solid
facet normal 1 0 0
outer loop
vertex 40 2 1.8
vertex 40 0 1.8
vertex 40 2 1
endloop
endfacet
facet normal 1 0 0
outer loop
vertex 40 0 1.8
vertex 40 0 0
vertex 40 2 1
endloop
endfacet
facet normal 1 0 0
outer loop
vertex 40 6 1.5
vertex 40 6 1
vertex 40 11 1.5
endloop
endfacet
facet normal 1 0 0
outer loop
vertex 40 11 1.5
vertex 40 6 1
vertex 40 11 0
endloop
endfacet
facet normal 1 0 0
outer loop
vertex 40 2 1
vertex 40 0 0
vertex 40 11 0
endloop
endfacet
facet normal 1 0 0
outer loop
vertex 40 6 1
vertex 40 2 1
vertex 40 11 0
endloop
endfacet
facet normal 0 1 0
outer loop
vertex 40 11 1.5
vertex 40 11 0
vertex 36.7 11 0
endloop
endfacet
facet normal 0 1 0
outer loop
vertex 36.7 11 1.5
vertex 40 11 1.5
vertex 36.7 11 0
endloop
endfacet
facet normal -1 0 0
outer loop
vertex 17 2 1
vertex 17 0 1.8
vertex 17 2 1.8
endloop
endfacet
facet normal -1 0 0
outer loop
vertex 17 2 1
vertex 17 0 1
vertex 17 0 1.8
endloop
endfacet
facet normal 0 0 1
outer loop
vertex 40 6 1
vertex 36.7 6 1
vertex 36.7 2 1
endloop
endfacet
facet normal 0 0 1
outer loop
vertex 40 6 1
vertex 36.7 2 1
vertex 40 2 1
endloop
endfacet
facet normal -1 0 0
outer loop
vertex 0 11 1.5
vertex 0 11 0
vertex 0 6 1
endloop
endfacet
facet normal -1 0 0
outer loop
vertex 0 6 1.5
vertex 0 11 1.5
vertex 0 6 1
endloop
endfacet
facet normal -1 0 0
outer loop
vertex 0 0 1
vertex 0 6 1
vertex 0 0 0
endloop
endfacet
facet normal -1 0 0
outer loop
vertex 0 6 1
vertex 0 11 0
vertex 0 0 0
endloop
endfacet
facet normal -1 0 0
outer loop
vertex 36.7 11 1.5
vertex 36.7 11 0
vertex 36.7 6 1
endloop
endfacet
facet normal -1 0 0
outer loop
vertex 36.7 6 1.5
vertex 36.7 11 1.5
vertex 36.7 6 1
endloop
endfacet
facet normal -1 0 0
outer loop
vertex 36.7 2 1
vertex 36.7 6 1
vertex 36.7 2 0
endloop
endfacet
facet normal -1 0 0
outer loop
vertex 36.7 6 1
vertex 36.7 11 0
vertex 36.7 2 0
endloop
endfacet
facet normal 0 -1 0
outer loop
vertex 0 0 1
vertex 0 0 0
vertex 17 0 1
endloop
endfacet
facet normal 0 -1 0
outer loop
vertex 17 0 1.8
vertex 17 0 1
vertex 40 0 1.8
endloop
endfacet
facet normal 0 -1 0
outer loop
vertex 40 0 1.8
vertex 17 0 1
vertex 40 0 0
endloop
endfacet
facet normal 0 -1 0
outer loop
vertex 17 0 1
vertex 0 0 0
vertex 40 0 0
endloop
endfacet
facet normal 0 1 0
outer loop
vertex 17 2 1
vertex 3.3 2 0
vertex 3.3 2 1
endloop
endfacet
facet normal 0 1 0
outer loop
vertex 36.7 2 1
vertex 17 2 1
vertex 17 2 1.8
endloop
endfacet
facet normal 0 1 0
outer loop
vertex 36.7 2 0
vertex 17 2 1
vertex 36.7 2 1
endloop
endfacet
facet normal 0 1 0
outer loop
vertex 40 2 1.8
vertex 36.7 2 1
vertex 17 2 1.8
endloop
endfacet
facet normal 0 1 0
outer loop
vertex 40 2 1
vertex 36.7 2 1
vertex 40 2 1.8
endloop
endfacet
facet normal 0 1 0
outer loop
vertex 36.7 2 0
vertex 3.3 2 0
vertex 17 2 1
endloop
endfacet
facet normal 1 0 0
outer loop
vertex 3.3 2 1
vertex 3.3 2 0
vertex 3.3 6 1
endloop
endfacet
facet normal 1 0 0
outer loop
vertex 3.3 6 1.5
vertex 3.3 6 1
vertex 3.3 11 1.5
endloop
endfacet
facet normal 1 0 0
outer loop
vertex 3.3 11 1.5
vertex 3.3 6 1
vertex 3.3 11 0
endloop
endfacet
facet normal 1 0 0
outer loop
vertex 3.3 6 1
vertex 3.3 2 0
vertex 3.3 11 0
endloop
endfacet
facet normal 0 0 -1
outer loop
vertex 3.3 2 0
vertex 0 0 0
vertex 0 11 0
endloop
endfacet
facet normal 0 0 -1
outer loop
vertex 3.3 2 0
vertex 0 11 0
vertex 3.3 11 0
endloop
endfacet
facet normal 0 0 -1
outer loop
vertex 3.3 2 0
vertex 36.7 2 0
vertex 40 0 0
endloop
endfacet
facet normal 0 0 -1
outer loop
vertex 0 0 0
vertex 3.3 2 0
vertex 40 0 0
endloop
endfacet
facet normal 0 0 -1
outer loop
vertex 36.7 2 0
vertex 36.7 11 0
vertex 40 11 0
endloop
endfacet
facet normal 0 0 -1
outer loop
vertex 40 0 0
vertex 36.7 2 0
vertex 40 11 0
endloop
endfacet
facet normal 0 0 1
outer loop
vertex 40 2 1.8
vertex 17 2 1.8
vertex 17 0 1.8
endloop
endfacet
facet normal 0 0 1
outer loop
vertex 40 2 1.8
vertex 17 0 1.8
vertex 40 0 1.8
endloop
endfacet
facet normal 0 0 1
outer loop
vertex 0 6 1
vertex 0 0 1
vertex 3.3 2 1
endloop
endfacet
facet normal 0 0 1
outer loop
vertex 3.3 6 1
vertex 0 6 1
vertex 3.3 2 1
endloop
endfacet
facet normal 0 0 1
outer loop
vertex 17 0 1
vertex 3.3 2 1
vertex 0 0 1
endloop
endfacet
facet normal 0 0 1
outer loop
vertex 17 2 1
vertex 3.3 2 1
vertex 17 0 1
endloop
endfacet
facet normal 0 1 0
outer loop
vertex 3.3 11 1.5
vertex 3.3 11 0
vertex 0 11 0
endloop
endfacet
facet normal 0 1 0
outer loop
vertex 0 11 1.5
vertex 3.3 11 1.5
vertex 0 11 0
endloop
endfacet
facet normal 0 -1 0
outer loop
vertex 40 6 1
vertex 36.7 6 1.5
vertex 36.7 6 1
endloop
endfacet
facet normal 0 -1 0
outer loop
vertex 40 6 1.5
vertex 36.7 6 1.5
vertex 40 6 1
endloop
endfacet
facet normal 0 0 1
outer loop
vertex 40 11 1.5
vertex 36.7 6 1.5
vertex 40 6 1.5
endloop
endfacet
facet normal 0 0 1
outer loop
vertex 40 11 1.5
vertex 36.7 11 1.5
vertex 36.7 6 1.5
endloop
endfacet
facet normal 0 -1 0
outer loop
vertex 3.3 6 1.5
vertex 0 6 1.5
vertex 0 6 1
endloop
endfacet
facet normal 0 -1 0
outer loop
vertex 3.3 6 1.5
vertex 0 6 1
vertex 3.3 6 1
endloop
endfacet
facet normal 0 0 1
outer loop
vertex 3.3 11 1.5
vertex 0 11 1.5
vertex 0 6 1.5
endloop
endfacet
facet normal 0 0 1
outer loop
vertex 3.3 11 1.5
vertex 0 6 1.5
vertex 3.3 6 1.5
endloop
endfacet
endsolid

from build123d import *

# Parameters (mm, degrees)
F1_DEPTH = 1.5
F2_W     = 3.3
F2_H     = 4
F2_W_2   = 17
F2_H_2   = 6
F3_DEPTH = 0.5
F4_W     = 23
F4_H     = 2
F5_DEPTH = 0.3


with BuildPart() as f1:
    # F0 (on Top) → F1 (new body)
    with BuildSketch(Plane.XY):
        Polygon((0, 11), (0, 0), (40, 0), (40, 11), (36.7, 11), (36.7, 2), (3.3, 2), (3.3, 11), align=None)
    extrude(amount=F1_DEPTH)

    # F2 (on face) → F3 (cut)
    with BuildSketch(Plane.XY.offset(1.5)):
        with Locations((38.35, 4)):
            Rectangle(F2_W, F2_H)
        with Locations((8.5, 3)):
            Rectangle(F2_W_2, F2_H_2)
    extrude(amount=-F3_DEPTH, mode=Mode.SUBTRACT)

    # F4 (on face) → F5 (join)
    with BuildSketch(Plane.XY.offset(1.5)):
        with Locations((28.5, 1)):
            Rectangle(F4_W, F4_H)
    extrude(amount=F5_DEPTH)


solid = f1.part
